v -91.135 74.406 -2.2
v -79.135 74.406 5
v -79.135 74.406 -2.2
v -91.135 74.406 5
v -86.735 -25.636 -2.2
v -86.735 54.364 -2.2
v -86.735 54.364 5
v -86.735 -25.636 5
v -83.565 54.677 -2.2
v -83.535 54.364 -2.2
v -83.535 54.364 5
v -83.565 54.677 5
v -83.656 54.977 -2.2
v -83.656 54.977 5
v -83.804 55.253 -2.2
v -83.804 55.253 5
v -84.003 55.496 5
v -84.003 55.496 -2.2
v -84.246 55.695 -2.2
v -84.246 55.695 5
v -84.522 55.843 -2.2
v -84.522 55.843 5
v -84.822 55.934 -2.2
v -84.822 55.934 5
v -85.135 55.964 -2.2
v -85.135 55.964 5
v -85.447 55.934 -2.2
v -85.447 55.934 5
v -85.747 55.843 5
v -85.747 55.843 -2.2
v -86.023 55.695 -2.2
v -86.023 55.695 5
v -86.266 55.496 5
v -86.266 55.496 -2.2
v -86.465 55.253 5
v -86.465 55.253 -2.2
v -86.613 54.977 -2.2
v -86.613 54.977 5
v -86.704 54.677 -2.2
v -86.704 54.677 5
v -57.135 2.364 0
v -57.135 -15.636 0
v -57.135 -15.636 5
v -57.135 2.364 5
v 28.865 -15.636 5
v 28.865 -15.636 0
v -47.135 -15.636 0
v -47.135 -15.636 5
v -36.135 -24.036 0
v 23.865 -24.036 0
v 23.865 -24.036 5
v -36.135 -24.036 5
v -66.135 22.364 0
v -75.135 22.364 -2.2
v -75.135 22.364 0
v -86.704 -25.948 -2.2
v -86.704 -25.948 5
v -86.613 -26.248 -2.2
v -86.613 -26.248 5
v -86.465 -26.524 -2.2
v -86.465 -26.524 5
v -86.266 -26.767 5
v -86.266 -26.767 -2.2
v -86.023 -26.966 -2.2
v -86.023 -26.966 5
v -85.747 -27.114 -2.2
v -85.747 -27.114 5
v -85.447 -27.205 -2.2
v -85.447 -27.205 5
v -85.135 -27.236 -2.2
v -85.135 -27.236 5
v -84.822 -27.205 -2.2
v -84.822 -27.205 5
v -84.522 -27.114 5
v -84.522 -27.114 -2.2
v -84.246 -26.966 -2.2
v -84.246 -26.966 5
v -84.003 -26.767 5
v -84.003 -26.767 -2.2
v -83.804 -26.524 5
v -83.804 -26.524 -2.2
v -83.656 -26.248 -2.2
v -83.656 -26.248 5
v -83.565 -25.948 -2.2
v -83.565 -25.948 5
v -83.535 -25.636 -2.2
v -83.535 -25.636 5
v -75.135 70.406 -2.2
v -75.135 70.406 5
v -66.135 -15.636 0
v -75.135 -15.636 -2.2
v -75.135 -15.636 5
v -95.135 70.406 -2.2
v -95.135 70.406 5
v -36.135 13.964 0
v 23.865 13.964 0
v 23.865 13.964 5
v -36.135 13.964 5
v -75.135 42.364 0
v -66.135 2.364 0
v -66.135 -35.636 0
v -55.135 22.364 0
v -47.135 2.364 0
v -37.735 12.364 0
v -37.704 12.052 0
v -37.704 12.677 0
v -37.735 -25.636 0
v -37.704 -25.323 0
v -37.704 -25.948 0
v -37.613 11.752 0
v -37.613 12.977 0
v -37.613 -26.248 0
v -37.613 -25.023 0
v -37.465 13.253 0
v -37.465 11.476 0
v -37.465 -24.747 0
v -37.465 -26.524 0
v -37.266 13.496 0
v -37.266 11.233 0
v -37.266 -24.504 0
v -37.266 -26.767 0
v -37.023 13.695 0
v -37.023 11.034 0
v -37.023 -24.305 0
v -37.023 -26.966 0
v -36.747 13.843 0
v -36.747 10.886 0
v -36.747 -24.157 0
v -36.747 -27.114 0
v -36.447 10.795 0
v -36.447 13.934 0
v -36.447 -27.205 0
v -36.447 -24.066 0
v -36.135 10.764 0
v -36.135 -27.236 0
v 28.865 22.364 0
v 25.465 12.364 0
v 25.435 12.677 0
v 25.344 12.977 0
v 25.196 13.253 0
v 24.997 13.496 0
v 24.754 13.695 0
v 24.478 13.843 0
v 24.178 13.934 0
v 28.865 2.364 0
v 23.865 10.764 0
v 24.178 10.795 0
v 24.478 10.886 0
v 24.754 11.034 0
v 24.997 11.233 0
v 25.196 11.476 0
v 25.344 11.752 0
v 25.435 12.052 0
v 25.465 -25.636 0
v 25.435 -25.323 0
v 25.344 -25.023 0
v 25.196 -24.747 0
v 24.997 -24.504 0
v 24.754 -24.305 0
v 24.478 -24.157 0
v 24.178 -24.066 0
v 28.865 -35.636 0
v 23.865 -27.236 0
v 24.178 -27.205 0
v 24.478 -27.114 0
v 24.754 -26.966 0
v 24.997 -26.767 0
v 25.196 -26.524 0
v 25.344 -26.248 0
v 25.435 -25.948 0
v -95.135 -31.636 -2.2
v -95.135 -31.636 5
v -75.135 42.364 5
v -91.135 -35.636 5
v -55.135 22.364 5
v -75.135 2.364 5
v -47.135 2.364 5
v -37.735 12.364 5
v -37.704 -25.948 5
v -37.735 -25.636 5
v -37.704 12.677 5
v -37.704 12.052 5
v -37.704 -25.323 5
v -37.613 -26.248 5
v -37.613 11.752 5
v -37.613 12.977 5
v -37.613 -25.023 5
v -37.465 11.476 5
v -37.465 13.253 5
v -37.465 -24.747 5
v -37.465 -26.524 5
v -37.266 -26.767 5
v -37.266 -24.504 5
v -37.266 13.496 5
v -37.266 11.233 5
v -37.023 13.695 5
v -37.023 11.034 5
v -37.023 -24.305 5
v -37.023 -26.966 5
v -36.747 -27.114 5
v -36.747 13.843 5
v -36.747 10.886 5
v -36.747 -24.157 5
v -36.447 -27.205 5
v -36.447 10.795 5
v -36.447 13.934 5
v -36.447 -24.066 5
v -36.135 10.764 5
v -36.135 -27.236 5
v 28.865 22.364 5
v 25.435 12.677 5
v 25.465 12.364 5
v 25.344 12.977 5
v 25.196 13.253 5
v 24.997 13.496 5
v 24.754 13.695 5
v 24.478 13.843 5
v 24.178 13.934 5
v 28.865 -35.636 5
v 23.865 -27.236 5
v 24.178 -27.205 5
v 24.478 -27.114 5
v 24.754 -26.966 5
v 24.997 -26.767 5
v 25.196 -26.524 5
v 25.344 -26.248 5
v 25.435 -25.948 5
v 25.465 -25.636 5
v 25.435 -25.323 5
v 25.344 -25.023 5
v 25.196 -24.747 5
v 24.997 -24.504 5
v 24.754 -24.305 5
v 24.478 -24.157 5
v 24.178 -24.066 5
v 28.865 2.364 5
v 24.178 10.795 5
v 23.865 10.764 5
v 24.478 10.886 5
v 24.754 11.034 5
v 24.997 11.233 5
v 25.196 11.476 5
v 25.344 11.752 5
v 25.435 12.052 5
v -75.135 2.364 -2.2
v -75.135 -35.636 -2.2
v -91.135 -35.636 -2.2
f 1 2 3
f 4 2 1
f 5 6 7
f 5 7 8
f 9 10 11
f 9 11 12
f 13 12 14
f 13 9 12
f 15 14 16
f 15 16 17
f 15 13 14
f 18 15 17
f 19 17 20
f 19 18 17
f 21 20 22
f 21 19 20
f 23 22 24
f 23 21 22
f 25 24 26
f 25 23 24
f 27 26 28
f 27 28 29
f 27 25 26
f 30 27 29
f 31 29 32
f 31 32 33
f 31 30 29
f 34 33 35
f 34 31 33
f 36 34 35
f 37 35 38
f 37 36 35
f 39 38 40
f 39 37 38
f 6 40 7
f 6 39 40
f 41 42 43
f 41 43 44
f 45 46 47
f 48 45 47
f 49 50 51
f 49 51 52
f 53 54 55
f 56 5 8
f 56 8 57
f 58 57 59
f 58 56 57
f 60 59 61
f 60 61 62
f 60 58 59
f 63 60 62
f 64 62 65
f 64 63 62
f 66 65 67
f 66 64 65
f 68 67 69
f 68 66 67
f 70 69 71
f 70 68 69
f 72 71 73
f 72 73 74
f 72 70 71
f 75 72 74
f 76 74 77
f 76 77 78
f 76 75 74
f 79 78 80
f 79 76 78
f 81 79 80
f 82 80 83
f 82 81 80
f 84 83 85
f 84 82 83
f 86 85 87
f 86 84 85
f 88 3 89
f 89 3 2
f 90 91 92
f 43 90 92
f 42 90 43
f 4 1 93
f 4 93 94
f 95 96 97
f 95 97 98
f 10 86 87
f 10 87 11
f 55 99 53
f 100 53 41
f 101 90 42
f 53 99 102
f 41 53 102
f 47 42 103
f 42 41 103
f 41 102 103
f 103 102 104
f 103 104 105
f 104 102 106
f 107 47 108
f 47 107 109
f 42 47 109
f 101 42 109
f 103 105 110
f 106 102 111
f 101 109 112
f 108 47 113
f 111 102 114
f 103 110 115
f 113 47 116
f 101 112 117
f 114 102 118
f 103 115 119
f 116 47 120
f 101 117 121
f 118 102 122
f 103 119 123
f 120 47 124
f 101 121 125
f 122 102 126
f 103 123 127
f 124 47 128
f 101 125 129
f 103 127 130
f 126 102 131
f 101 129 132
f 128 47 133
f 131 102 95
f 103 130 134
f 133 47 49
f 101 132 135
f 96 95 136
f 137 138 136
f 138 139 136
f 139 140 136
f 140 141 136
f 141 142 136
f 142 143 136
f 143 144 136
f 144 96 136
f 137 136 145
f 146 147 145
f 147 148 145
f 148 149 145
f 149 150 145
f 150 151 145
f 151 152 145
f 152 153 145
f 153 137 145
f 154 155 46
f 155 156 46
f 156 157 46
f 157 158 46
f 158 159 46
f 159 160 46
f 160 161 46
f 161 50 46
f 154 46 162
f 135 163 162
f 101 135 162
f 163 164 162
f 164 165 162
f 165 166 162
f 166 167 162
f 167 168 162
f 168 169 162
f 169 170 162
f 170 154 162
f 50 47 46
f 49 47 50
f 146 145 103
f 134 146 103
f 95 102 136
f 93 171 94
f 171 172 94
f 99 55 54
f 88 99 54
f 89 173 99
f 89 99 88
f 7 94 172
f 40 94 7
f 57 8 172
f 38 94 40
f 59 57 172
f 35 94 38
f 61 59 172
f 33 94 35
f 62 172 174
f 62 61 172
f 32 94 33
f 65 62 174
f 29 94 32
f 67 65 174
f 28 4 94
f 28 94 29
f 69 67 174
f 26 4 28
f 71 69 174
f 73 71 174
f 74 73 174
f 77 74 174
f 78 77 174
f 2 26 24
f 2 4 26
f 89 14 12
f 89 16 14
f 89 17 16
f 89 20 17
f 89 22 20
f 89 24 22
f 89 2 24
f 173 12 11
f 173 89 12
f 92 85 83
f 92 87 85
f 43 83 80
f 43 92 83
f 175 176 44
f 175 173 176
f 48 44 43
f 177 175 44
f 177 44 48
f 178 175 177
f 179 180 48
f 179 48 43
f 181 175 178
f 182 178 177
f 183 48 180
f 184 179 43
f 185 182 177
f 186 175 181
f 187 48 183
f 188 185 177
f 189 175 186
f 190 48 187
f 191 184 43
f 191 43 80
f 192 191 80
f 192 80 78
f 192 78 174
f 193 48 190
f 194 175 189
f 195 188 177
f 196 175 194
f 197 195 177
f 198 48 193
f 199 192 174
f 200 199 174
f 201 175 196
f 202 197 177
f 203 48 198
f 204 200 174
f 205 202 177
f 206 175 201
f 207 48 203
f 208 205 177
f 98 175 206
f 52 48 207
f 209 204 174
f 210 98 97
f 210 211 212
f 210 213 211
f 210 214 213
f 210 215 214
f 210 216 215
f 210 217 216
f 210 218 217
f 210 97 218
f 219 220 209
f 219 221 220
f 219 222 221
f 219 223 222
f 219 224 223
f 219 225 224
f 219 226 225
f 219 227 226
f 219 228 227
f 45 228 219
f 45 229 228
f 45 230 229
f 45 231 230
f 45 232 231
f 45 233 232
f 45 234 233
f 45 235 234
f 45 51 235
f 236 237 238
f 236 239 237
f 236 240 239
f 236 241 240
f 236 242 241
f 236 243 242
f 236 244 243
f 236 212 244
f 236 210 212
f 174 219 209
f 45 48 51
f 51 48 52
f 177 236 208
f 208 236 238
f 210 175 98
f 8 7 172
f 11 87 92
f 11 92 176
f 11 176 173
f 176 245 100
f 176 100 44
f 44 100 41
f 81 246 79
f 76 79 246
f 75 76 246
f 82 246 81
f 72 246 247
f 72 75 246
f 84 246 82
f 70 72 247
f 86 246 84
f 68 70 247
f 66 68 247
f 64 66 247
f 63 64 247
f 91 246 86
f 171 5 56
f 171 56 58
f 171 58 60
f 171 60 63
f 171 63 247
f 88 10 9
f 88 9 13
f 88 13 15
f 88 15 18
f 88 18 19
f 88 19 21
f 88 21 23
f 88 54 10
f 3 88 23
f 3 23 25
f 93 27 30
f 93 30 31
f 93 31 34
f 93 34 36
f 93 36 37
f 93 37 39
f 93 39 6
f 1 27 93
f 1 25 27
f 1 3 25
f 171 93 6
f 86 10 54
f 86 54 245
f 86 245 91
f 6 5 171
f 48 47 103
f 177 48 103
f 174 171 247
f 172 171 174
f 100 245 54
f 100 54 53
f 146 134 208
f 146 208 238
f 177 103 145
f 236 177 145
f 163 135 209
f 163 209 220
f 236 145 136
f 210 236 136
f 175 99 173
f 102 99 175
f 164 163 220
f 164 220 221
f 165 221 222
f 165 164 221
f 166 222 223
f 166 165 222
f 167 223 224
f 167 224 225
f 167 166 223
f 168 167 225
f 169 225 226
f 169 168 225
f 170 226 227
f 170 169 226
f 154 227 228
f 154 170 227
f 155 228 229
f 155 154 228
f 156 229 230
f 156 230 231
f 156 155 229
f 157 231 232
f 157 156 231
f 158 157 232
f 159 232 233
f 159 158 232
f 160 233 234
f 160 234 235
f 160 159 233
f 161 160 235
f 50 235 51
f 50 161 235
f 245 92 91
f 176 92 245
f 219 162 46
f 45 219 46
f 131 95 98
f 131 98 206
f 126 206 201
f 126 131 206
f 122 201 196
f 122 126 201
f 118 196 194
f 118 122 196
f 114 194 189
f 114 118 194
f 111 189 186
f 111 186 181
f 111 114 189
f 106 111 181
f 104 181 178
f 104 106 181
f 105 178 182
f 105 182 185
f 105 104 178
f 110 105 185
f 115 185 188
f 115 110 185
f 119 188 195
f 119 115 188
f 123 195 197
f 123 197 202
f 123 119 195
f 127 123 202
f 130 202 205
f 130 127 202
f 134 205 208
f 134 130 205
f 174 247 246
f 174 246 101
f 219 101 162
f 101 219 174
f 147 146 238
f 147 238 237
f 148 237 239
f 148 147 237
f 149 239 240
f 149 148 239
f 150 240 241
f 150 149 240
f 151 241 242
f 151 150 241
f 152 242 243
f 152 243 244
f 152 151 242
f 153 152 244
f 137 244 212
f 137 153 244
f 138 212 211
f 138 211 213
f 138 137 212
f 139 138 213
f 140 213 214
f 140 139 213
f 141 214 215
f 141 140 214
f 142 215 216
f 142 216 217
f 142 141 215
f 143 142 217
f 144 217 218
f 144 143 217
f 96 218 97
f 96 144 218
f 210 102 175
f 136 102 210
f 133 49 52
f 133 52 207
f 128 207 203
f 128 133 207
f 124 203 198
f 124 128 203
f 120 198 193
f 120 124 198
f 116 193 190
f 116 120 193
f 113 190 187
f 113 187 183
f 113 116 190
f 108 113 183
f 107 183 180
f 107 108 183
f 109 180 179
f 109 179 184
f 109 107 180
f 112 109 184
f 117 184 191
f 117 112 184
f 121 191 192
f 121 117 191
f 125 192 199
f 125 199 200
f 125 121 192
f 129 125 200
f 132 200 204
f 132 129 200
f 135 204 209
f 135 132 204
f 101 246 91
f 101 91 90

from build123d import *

# Parameters (mm, degrees)
SKETCH_1_W                  = 76
SKETCH_1_H                  = 20
SKETCH_1_W_2                = 18
SKETCH_1_W_3                = 10
SKETCH_1_H_2                = 18
SKETCH_1_W_4                = 20
SKETCH_1_H_3                = 52.041621827
EXTRUDE_1_DEPTH             = 5
HOLE_WIZARD_3_2_3_2_1_DEPTH = 5
SKETCH_8_W                  = 20
SKETCH_8_H                  = 110.041621827
EXTRUDE_2_DEPTH             = 2.2
HOLE_START                  = -2.2
HOLE_WIZARD_3_2_3_2_3_DEPTH = 7.2
RIB_1_REACH                 = 147.55
SKETCH_11_WALL_W            = 302.364540162
SKETCH_11_WALL_H            = 20
RIB_2_REACH                 = 113.533
SKETCH_12_WALL_W            = 234.330707354
SKETCH_12_WALL_H            = 20
RIB_3_REACH                 = 122.99
SKETCH_13_WALL_W            = 272.265137078
SKETCH_13_WALL_H            = 5
CHAMFER_1_SIZE              = 4


# Read off the part's stored shape, not the designer's step: Ø3.2 (3.2) 直径槽口1, Ø3.2 (3.2) 直径槽口3
with BuildPart() as part:
    # 草图1 → 凸台-拉伸1 (new body)
    with BuildSketch(Plane.XY):
        with Locations((-9.134530028, -25.635533007)):
            Rectangle(SKETCH_1_W, SKETCH_1_H)
        with Locations((-66.134530028, -25.635533007)):
            Rectangle(SKETCH_1_W_2, SKETCH_1_H)
        with Locations((-52.134530028, -25.635533007)):
            Rectangle(SKETCH_1_W_3, SKETCH_1_H)
        with Locations((-66.134530028, 12.364466993)):
            Rectangle(SKETCH_1_W_2, SKETCH_1_H)
        with Locations((-9.134530028, 12.364466993)):
            Rectangle(SKETCH_1_W, SKETCH_1_H)
        with Locations((-52.134530028, 12.364466993)):
            Rectangle(SKETCH_1_W_3, SKETCH_1_H)
        with Locations((-52.134530028, -6.635533007)):
            Rectangle(SKETCH_1_W_3, SKETCH_1_H_2)
        with Locations((-85.134530028, 12.364466993)):
            Rectangle(SKETCH_1_W_4, SKETCH_1_H)
        with Locations((-85.134530028, -6.635533007)):
            Rectangle(SKETCH_1_W_4, SKETCH_1_H_2)
        with Locations((-85.134530028, -25.635533007)):
            Rectangle(SKETCH_1_W_4, SKETCH_1_H)
        with Locations((-85.134530028, 48.385277907)):
            Rectangle(SKETCH_1_W_4, SKETCH_1_H_3)
    extrude(amount=EXTRUDE_1_DEPTH)

    # Ø3.2 (3.2) 直径槽口1 outline → Ø3.2 (3.2) 直径槽口1 (cut)
    with BuildSketch(Plane.XY):
        with BuildLine():
            Line((-36.134530028, 10.764466993), (23.865469972, 10.764466993))
            ThreePointArc((23.865469972, 10.764466993), (25.465469972, 12.364466993), (23.865469972, 13.964466993))
            Line((23.865469972, 13.964466993), (-36.134530028, 13.964466993))
            ThreePointArc((-36.134530028, 13.964466993), (-37.734530028, 12.364466993), (-36.134530028, 10.764466993))
        make_face()
        with BuildLine():
            Line((-36.134530028, -27.235533007), (23.865469972, -27.235533007))
            ThreePointArc((23.865469972, -27.235533007), (25.465469972, -25.635533007), (23.865469972, -24.035533007))
            Line((23.865469972, -24.035533007), (-36.134530028, -24.035533007))
            ThreePointArc((-36.134530028, -24.035533007), (-37.734530028, -25.635533007), (-36.134530028, -27.235533007))
        make_face()
    extrude(amount=HOLE_WIZARD_3_2_3_2_1_DEPTH, mode=Mode.SUBTRACT)

    # 草图8 → 凸台-拉伸2 (add)
    with BuildSketch(Plane(origin=(0, 0, 0), x_dir=(-1, 0, 0), z_dir=(0, 0, -1))):
        with Locations((85.134530028, 19.385277907)):
            Rectangle(SKETCH_8_W, SKETCH_8_H)
    extrude(amount=EXTRUDE_2_DEPTH)

    # Ø3.2 (3.2) 直径槽口3 outline → Ø3.2 (3.2) 直径槽口3 (cut)
    with BuildSketch(Plane.XY.offset(HOLE_START)):
        with BuildLine():
            Line((-83.534530028, -25.635533007), (-83.534530028, 54.364466993))
            ThreePointArc((-83.534530028, 54.364466993), (-85.134530028, 55.964466993), (-86.734530028, 54.364466993))
            Line((-86.734530028, 54.364466993), (-86.734530028, -25.635533007))
            ThreePointArc((-86.734530028, -25.635533007), (-85.134530028, -27.235533007), (-83.534530028, -25.635533007))
        make_face()
    extrude(amount=HOLE_WIZARD_3_2_3_2_3_DEPTH, mode=Mode.SUBTRACT)

    # 草图11 wall → 筋1 (add, up to next)
    with BuildSketch(Plane(origin=(-70.634530028, -35.635533007, -1.1), x_dir=(0.971399006497, 0, 0.237453090477), z_dir=(-0.237453090477, 0, 0.971399006497)), mode=Mode.PRIVATE) as rib_1_sk1:
        with Locations((0, 10)):
            Rectangle(SKETCH_11_WALL_W, SKETCH_11_WALL_H)
    rib_1_tool1 = extrude(rib_1_sk1.sketch, amount=RIB_1_REACH, mode=Mode.PRIVATE) - part.part
    add(rib_1_tool1.solids().sort_by_distance((-70.634530028, -35.635533007, -1.1))[0])

    # 草图12 wall → 筋2 (add, up to next)
    with BuildSketch(Plane(origin=(-70.634530028, 22.364466993, -1.1), x_dir=(0.971399006497, 0, 0.237453090477), z_dir=(0.237453090477, 0, -0.971399006497)), mode=Mode.PRIVATE) as rib_2_sk1:
        with Locations((0, 10)):
            Rectangle(SKETCH_12_WALL_W, SKETCH_12_WALL_H)
    rib_2_tool1 = extrude(rib_2_sk1.sketch, amount=-RIB_2_REACH, mode=Mode.PRIVATE) - part.part
    add(rib_2_tool1.solids().sort_by_distance((-70.634530028, 22.364466993, -1.1))[0])

    # 草图13 wall → 筋3 (add, up to next)
    with BuildSketch(Plane(origin=(-65.134530028, 32.364466993, 5), x_dir=(0.707106781187, -0.707106781187, 0), z_dir=(0.707106781187, 0.707106781187, 0)), mode=Mode.PRIVATE) as rib_3_sk1:
        with Locations((0, 2.5)):
            Rectangle(SKETCH_13_WALL_W, SKETCH_13_WALL_H)
    rib_3_tool1 = extrude(rib_3_sk1.sketch, amount=-RIB_3_REACH, mode=Mode.PRIVATE) - part.part
    add(rib_3_tool1.solids().sort_by_distance((-65.134530028, 32.364466993, 5))[0])

    # 倒角1
    chamfer_1_edges = [part.edges().sort_by_distance(p)[0] for p in [
        (-75.134530028, 74.40608882, 1.4),
        (-95.134530028, -35.635533007, 1.4),
        (-95.134530028, 74.40608882, 1.4),
    ]]
    chamfer(chamfer_1_edges, length=CHAMFER_1_SIZE)


solid = part.part
